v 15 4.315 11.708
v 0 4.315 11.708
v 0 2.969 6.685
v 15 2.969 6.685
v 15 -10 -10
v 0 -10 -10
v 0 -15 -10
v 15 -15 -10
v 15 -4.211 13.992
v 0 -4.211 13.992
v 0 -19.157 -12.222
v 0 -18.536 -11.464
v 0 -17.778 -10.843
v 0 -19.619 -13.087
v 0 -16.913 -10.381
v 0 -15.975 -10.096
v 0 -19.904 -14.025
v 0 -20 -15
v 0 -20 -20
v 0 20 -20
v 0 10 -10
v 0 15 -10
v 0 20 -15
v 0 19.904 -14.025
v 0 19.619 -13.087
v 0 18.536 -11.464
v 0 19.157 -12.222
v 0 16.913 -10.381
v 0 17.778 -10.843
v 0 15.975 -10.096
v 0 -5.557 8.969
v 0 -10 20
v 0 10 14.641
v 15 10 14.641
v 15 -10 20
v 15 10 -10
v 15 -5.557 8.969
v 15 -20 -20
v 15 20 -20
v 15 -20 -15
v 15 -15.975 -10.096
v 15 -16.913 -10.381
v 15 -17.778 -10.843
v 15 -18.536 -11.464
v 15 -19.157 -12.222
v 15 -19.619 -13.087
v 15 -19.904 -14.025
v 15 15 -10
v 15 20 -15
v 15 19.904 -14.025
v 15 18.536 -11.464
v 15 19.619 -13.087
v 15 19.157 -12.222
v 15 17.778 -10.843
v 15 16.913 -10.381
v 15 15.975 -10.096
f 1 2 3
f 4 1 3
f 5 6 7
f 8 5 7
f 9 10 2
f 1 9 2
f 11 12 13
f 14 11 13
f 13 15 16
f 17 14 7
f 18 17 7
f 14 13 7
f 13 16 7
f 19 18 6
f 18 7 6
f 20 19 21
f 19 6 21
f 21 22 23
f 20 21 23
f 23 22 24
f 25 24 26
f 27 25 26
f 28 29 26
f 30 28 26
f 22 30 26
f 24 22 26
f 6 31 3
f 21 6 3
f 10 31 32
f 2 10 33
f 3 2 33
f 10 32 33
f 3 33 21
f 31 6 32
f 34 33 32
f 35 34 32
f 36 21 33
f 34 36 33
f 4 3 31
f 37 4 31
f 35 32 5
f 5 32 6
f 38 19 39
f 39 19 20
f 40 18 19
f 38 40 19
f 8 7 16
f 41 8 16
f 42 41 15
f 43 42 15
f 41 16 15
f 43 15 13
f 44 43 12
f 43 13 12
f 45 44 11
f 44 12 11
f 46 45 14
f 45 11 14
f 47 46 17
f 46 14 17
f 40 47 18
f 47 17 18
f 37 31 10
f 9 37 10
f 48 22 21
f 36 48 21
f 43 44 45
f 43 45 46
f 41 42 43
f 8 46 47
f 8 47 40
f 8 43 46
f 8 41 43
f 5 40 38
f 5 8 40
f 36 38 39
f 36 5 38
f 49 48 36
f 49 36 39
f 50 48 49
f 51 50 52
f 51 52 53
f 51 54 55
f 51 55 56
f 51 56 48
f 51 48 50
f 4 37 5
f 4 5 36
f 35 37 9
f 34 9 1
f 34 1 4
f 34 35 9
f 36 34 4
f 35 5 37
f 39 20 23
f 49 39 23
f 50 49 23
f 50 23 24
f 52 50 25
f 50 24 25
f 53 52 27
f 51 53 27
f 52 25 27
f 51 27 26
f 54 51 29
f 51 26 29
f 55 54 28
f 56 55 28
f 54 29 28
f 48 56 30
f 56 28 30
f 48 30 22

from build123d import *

# Parameters (mm, degrees)
F1_DEPTH = 15


with BuildPart() as f1:
    # F0 (on Right) → F1 (new body)
    with BuildSketch(Plane.YZ):
        with BuildLine():
            Line((-20, -20), (-10, -20))
            Line((-10, -20), (10, -20))
            Line((10, -20), (20, -20))
            Line((20, -20), (20, -15))
            ThreePointArc((20, -15), (18.535534, -11.464466), (15, -10))
            Line((15, -10), (10, -10))
            Line((10, -10), (10, 14.641016))
            Line((10, 14.641016), (-10, 20))
            Line((-10, 20), (-10, -10))
            Line((-10, -10), (-15, -10))
            ThreePointArc((-15, -10), (-18.535534, -11.464466), (-20, -15))
            Line((-20, -15), (-20, -20))
        make_face()
        Polygon((-4.211055, 13.992027), (4.314648, 11.707572), (2.968838, 6.684938), (-5.556865, 8.969393), align=None, mode=Mode.SUBTRACT)
    extrude(amount=F1_DEPTH)


solid = f1.part
